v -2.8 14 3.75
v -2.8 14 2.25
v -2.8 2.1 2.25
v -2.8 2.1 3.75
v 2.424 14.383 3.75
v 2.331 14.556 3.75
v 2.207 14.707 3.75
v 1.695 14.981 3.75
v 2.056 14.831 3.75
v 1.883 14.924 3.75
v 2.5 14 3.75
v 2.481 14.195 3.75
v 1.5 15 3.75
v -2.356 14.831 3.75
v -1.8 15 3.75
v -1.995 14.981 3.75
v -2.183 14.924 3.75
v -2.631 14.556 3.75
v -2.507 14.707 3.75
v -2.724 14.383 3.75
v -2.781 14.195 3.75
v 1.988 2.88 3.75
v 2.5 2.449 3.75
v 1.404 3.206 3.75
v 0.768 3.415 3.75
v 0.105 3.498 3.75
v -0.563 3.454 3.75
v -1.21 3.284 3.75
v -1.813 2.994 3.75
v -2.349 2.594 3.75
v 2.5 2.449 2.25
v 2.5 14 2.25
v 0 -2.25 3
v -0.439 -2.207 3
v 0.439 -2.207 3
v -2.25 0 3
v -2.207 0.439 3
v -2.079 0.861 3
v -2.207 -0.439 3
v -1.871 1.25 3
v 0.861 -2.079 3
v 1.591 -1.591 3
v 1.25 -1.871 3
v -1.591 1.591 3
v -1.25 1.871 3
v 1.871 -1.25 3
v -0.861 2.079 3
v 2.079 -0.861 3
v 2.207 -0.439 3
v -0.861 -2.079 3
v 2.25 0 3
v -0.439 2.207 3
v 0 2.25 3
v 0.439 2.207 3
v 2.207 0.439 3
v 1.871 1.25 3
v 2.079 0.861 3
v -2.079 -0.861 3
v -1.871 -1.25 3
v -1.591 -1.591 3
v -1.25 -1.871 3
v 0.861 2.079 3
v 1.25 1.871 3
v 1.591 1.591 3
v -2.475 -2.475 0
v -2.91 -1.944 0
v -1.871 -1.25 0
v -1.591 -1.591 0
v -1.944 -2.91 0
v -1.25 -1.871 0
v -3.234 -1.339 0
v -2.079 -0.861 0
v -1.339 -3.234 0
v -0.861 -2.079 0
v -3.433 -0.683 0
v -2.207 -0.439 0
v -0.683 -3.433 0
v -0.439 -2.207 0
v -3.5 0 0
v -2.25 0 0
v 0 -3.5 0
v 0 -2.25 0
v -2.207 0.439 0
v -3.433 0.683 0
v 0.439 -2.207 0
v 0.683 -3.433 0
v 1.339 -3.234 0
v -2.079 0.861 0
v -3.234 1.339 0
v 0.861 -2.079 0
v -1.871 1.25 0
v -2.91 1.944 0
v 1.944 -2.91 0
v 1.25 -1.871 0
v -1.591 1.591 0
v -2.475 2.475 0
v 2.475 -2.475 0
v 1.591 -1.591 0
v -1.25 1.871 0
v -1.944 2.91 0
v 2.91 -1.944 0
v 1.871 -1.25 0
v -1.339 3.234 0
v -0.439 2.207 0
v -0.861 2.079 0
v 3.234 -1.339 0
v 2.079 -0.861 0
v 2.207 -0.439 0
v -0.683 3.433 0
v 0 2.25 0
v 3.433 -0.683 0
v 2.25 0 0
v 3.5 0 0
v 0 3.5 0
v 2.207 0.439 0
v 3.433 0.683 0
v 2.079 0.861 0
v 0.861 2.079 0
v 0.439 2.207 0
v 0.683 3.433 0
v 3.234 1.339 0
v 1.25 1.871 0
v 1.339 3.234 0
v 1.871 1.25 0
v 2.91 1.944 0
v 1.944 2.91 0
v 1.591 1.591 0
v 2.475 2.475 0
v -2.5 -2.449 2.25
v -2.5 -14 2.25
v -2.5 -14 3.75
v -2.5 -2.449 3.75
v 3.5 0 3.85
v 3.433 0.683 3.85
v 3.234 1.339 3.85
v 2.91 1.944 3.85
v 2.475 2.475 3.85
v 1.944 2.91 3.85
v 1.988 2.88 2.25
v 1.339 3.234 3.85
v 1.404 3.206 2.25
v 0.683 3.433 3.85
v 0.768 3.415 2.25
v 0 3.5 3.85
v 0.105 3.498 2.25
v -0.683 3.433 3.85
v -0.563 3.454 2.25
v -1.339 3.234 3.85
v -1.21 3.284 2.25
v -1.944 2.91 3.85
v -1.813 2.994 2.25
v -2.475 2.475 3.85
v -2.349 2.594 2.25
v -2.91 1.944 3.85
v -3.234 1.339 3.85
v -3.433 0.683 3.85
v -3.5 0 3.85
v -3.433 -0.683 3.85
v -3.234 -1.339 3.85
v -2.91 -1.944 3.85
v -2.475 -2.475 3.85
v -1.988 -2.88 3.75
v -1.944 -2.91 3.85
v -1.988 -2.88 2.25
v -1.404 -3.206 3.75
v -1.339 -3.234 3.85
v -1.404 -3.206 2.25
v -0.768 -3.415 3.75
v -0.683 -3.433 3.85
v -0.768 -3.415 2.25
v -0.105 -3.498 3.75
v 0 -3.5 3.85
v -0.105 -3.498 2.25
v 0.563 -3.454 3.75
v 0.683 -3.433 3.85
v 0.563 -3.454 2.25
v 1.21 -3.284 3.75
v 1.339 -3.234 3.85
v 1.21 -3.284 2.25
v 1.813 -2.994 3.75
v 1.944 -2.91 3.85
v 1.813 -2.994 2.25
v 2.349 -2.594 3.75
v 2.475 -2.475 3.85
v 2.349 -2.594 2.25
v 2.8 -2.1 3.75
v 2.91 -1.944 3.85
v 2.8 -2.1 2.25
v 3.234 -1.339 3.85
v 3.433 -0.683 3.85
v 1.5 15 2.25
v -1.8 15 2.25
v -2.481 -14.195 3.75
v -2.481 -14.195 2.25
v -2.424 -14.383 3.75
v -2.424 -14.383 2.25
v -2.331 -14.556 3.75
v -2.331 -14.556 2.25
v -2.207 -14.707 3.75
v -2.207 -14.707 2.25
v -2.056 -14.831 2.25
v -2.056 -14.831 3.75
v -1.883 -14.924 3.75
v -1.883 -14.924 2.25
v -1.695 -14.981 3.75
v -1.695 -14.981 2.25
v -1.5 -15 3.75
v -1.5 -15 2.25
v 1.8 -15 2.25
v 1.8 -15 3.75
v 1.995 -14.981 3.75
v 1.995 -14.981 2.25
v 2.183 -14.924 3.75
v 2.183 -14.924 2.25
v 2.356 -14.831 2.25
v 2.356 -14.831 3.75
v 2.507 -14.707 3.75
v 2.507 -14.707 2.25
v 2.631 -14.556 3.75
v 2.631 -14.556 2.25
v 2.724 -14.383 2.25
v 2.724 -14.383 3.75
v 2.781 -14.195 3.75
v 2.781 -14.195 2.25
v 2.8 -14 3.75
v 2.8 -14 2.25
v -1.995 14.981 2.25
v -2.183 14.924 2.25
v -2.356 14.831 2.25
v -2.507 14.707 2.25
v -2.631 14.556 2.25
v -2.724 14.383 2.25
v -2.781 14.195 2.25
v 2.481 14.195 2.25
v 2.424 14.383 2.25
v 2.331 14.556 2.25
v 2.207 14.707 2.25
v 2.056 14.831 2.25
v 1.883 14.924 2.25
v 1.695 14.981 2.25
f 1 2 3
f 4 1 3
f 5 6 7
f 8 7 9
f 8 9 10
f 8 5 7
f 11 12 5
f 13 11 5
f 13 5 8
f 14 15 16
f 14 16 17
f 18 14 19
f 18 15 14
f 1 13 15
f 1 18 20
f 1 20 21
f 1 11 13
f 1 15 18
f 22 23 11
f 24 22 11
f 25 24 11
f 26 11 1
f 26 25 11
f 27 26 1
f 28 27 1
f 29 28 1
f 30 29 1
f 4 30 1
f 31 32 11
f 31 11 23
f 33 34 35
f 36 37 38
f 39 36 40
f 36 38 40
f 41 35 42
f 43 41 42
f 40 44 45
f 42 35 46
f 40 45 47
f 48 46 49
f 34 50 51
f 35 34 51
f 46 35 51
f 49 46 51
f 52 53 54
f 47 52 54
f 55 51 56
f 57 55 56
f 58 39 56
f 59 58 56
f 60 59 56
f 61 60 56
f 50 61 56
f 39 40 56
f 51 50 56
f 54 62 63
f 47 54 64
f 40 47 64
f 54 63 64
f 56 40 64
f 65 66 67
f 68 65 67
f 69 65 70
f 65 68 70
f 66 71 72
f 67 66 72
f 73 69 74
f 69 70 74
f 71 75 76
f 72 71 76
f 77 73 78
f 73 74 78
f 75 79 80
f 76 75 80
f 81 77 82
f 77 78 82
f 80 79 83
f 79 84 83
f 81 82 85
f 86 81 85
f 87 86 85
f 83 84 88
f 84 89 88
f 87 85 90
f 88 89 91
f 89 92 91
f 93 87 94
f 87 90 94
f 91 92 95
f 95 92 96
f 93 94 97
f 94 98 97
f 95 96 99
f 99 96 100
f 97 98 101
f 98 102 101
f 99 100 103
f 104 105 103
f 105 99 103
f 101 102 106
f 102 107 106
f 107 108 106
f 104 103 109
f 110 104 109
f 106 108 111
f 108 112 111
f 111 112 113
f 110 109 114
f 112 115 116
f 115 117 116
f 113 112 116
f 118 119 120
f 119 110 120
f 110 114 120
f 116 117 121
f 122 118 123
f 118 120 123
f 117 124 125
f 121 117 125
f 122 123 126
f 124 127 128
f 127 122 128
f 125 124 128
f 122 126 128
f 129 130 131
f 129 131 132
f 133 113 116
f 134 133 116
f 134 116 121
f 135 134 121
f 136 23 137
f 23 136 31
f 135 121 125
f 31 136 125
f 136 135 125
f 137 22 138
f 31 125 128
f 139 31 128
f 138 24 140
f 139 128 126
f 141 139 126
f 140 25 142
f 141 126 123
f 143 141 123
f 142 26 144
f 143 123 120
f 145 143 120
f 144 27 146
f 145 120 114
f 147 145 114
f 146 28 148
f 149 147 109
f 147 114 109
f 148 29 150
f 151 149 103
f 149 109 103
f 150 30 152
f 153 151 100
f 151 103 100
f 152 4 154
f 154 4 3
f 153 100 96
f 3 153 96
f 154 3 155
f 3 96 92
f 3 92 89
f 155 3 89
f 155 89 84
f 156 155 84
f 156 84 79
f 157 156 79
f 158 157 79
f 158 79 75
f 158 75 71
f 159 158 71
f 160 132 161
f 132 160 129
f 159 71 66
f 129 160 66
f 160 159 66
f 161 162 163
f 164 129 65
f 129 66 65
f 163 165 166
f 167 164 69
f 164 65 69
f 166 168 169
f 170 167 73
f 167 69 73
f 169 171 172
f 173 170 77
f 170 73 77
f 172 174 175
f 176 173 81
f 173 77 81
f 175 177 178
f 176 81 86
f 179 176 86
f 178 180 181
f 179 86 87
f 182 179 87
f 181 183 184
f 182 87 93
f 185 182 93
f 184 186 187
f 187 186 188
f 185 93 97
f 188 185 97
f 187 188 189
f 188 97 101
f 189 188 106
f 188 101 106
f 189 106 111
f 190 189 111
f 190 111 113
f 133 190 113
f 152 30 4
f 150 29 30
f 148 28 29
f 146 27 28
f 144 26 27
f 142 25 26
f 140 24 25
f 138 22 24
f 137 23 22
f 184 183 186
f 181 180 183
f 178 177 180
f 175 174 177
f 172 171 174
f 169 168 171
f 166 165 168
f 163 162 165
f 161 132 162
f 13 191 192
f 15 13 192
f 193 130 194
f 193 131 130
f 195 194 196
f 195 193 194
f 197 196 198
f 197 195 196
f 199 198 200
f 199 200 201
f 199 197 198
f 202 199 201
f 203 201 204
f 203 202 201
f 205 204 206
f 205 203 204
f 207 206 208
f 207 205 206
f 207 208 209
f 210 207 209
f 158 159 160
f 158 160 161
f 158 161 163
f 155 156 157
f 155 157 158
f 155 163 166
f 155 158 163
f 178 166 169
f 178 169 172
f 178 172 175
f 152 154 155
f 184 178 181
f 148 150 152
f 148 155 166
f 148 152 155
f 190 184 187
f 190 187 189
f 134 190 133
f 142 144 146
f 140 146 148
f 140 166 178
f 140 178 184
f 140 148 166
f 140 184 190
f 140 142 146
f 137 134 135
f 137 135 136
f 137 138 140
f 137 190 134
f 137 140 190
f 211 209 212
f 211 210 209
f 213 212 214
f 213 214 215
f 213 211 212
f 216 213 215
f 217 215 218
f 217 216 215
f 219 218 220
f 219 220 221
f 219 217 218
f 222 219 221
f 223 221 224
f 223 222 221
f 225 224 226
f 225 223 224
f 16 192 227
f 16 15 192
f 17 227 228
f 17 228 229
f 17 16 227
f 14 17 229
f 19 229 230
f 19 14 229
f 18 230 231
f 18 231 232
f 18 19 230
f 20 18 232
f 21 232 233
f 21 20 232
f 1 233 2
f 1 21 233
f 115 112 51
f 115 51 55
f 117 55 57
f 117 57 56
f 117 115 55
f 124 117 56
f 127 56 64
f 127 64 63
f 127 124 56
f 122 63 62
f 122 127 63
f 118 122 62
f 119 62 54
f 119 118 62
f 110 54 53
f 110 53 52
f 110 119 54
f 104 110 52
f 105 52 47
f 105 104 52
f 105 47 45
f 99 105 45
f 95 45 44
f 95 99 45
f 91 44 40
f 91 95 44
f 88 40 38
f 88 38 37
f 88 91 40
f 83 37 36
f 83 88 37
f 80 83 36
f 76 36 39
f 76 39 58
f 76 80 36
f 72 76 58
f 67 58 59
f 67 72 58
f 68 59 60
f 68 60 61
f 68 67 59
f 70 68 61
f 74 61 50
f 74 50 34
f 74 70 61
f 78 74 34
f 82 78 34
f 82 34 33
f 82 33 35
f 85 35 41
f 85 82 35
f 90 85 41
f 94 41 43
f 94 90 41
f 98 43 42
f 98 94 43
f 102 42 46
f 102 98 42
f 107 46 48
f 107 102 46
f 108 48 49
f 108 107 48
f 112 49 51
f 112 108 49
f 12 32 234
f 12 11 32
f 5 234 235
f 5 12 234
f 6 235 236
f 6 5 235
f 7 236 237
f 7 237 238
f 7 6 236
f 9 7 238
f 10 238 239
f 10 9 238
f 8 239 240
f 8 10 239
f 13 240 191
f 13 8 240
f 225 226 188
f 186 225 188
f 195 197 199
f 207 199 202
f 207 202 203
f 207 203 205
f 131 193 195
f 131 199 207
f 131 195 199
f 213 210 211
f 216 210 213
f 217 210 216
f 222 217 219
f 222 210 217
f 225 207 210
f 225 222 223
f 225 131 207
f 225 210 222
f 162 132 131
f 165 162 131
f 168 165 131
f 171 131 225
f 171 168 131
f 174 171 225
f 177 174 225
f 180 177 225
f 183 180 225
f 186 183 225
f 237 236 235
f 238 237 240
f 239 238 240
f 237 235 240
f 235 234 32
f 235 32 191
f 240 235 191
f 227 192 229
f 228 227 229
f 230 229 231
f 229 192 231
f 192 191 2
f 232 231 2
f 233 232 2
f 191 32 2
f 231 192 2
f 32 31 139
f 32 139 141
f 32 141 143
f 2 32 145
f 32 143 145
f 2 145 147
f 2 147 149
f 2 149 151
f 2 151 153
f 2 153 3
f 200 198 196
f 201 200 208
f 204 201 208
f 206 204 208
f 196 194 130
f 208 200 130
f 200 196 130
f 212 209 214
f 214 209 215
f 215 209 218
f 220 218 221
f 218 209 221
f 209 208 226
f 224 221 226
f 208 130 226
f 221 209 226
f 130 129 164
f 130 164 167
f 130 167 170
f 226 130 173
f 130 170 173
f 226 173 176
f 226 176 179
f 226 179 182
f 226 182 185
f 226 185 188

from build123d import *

# Parameters (mm, degrees)
CYLINDER008_R             = 2.25
CYLINDER008_DEPTH         = 3
BOX003_W                  = 5.3
BOX003_H                  = 13.5
BOX003_DEPTH              = 1.5
FILLET002_R               = 1
FILLET002_PLACEMENT_ANGLE = 180
BOX002_W                  = 5.3
BOX002_H                  = 13.5
BOX002_DEPTH              = 1.5
FILLET001_R               = 1
CYLINDER007_R             = 3.5
CYLINDER007_DEPTH         = 3.85


with BuildPart() as cylinder008:
    # Cylinder008 → Cylinder008 (new body)
    with BuildSketch(Plane.XY):
        Circle(CYLINDER008_R)
    extrude(amount=CYLINDER008_DEPTH)


with BuildPart() as fillet002:
    # Box003 → Box003 (new body)
    with BuildSketch(Plane(origin=(-2.5, -15, 2.25), x_dir=(1, 0, 0), z_dir=(0, 0, 1))):
        with Locations((2.65, 6.75)):
            Rectangle(BOX003_W, BOX003_H)
    extrude(amount=BOX003_DEPTH)

    # Fillet002
    fillet002_edges = [fillet002.edges().sort_by_distance(p)[0] for p in [
        (-2.5, -15, 3),
        (2.8, -15, 3),
    ]]
    fillet(fillet002_edges, radius=FILLET002_R)


with BuildPart() as fillet002_1:
    # Fillet002 placement: moved
    add(fillet002.part.rotate(Axis((0, 0, 0), (0, 0, 1)), FILLET002_PLACEMENT_ANGLE))


with BuildPart() as fillet001:
    # Box002 → Box002 (new body)
    with BuildSketch(Plane(origin=(-2.5, -15, 2.25), x_dir=(1, 0, 0), z_dir=(0, 0, 1))):
        with Locations((2.65, 6.75)):
            Rectangle(BOX002_W, BOX002_H)
    extrude(amount=BOX002_DEPTH)

    # Fillet001
    fillet001_edges = [fillet001.edges().sort_by_distance(p)[0] for p in [
        (-2.5, -15, 3),
        (2.8, -15, 3),
    ]]
    fillet(fillet001_edges, radius=FILLET001_R)


with BuildPart() as servoarmdouble:
    # Cylinder007 → Cylinder007 (new body)
    with BuildSketch(Plane.XY):
        Circle(CYLINDER007_R)
    extrude(amount=CYLINDER007_DEPTH)

    # Fusion004: union Fillet002, Fillet001
    add(fillet002_1.part)
    add(fillet001.part)

    # Cut002: cut Cylinder008
    add(cylinder008.part, mode=Mode.SUBTRACT)


solid = servoarmdouble.part
